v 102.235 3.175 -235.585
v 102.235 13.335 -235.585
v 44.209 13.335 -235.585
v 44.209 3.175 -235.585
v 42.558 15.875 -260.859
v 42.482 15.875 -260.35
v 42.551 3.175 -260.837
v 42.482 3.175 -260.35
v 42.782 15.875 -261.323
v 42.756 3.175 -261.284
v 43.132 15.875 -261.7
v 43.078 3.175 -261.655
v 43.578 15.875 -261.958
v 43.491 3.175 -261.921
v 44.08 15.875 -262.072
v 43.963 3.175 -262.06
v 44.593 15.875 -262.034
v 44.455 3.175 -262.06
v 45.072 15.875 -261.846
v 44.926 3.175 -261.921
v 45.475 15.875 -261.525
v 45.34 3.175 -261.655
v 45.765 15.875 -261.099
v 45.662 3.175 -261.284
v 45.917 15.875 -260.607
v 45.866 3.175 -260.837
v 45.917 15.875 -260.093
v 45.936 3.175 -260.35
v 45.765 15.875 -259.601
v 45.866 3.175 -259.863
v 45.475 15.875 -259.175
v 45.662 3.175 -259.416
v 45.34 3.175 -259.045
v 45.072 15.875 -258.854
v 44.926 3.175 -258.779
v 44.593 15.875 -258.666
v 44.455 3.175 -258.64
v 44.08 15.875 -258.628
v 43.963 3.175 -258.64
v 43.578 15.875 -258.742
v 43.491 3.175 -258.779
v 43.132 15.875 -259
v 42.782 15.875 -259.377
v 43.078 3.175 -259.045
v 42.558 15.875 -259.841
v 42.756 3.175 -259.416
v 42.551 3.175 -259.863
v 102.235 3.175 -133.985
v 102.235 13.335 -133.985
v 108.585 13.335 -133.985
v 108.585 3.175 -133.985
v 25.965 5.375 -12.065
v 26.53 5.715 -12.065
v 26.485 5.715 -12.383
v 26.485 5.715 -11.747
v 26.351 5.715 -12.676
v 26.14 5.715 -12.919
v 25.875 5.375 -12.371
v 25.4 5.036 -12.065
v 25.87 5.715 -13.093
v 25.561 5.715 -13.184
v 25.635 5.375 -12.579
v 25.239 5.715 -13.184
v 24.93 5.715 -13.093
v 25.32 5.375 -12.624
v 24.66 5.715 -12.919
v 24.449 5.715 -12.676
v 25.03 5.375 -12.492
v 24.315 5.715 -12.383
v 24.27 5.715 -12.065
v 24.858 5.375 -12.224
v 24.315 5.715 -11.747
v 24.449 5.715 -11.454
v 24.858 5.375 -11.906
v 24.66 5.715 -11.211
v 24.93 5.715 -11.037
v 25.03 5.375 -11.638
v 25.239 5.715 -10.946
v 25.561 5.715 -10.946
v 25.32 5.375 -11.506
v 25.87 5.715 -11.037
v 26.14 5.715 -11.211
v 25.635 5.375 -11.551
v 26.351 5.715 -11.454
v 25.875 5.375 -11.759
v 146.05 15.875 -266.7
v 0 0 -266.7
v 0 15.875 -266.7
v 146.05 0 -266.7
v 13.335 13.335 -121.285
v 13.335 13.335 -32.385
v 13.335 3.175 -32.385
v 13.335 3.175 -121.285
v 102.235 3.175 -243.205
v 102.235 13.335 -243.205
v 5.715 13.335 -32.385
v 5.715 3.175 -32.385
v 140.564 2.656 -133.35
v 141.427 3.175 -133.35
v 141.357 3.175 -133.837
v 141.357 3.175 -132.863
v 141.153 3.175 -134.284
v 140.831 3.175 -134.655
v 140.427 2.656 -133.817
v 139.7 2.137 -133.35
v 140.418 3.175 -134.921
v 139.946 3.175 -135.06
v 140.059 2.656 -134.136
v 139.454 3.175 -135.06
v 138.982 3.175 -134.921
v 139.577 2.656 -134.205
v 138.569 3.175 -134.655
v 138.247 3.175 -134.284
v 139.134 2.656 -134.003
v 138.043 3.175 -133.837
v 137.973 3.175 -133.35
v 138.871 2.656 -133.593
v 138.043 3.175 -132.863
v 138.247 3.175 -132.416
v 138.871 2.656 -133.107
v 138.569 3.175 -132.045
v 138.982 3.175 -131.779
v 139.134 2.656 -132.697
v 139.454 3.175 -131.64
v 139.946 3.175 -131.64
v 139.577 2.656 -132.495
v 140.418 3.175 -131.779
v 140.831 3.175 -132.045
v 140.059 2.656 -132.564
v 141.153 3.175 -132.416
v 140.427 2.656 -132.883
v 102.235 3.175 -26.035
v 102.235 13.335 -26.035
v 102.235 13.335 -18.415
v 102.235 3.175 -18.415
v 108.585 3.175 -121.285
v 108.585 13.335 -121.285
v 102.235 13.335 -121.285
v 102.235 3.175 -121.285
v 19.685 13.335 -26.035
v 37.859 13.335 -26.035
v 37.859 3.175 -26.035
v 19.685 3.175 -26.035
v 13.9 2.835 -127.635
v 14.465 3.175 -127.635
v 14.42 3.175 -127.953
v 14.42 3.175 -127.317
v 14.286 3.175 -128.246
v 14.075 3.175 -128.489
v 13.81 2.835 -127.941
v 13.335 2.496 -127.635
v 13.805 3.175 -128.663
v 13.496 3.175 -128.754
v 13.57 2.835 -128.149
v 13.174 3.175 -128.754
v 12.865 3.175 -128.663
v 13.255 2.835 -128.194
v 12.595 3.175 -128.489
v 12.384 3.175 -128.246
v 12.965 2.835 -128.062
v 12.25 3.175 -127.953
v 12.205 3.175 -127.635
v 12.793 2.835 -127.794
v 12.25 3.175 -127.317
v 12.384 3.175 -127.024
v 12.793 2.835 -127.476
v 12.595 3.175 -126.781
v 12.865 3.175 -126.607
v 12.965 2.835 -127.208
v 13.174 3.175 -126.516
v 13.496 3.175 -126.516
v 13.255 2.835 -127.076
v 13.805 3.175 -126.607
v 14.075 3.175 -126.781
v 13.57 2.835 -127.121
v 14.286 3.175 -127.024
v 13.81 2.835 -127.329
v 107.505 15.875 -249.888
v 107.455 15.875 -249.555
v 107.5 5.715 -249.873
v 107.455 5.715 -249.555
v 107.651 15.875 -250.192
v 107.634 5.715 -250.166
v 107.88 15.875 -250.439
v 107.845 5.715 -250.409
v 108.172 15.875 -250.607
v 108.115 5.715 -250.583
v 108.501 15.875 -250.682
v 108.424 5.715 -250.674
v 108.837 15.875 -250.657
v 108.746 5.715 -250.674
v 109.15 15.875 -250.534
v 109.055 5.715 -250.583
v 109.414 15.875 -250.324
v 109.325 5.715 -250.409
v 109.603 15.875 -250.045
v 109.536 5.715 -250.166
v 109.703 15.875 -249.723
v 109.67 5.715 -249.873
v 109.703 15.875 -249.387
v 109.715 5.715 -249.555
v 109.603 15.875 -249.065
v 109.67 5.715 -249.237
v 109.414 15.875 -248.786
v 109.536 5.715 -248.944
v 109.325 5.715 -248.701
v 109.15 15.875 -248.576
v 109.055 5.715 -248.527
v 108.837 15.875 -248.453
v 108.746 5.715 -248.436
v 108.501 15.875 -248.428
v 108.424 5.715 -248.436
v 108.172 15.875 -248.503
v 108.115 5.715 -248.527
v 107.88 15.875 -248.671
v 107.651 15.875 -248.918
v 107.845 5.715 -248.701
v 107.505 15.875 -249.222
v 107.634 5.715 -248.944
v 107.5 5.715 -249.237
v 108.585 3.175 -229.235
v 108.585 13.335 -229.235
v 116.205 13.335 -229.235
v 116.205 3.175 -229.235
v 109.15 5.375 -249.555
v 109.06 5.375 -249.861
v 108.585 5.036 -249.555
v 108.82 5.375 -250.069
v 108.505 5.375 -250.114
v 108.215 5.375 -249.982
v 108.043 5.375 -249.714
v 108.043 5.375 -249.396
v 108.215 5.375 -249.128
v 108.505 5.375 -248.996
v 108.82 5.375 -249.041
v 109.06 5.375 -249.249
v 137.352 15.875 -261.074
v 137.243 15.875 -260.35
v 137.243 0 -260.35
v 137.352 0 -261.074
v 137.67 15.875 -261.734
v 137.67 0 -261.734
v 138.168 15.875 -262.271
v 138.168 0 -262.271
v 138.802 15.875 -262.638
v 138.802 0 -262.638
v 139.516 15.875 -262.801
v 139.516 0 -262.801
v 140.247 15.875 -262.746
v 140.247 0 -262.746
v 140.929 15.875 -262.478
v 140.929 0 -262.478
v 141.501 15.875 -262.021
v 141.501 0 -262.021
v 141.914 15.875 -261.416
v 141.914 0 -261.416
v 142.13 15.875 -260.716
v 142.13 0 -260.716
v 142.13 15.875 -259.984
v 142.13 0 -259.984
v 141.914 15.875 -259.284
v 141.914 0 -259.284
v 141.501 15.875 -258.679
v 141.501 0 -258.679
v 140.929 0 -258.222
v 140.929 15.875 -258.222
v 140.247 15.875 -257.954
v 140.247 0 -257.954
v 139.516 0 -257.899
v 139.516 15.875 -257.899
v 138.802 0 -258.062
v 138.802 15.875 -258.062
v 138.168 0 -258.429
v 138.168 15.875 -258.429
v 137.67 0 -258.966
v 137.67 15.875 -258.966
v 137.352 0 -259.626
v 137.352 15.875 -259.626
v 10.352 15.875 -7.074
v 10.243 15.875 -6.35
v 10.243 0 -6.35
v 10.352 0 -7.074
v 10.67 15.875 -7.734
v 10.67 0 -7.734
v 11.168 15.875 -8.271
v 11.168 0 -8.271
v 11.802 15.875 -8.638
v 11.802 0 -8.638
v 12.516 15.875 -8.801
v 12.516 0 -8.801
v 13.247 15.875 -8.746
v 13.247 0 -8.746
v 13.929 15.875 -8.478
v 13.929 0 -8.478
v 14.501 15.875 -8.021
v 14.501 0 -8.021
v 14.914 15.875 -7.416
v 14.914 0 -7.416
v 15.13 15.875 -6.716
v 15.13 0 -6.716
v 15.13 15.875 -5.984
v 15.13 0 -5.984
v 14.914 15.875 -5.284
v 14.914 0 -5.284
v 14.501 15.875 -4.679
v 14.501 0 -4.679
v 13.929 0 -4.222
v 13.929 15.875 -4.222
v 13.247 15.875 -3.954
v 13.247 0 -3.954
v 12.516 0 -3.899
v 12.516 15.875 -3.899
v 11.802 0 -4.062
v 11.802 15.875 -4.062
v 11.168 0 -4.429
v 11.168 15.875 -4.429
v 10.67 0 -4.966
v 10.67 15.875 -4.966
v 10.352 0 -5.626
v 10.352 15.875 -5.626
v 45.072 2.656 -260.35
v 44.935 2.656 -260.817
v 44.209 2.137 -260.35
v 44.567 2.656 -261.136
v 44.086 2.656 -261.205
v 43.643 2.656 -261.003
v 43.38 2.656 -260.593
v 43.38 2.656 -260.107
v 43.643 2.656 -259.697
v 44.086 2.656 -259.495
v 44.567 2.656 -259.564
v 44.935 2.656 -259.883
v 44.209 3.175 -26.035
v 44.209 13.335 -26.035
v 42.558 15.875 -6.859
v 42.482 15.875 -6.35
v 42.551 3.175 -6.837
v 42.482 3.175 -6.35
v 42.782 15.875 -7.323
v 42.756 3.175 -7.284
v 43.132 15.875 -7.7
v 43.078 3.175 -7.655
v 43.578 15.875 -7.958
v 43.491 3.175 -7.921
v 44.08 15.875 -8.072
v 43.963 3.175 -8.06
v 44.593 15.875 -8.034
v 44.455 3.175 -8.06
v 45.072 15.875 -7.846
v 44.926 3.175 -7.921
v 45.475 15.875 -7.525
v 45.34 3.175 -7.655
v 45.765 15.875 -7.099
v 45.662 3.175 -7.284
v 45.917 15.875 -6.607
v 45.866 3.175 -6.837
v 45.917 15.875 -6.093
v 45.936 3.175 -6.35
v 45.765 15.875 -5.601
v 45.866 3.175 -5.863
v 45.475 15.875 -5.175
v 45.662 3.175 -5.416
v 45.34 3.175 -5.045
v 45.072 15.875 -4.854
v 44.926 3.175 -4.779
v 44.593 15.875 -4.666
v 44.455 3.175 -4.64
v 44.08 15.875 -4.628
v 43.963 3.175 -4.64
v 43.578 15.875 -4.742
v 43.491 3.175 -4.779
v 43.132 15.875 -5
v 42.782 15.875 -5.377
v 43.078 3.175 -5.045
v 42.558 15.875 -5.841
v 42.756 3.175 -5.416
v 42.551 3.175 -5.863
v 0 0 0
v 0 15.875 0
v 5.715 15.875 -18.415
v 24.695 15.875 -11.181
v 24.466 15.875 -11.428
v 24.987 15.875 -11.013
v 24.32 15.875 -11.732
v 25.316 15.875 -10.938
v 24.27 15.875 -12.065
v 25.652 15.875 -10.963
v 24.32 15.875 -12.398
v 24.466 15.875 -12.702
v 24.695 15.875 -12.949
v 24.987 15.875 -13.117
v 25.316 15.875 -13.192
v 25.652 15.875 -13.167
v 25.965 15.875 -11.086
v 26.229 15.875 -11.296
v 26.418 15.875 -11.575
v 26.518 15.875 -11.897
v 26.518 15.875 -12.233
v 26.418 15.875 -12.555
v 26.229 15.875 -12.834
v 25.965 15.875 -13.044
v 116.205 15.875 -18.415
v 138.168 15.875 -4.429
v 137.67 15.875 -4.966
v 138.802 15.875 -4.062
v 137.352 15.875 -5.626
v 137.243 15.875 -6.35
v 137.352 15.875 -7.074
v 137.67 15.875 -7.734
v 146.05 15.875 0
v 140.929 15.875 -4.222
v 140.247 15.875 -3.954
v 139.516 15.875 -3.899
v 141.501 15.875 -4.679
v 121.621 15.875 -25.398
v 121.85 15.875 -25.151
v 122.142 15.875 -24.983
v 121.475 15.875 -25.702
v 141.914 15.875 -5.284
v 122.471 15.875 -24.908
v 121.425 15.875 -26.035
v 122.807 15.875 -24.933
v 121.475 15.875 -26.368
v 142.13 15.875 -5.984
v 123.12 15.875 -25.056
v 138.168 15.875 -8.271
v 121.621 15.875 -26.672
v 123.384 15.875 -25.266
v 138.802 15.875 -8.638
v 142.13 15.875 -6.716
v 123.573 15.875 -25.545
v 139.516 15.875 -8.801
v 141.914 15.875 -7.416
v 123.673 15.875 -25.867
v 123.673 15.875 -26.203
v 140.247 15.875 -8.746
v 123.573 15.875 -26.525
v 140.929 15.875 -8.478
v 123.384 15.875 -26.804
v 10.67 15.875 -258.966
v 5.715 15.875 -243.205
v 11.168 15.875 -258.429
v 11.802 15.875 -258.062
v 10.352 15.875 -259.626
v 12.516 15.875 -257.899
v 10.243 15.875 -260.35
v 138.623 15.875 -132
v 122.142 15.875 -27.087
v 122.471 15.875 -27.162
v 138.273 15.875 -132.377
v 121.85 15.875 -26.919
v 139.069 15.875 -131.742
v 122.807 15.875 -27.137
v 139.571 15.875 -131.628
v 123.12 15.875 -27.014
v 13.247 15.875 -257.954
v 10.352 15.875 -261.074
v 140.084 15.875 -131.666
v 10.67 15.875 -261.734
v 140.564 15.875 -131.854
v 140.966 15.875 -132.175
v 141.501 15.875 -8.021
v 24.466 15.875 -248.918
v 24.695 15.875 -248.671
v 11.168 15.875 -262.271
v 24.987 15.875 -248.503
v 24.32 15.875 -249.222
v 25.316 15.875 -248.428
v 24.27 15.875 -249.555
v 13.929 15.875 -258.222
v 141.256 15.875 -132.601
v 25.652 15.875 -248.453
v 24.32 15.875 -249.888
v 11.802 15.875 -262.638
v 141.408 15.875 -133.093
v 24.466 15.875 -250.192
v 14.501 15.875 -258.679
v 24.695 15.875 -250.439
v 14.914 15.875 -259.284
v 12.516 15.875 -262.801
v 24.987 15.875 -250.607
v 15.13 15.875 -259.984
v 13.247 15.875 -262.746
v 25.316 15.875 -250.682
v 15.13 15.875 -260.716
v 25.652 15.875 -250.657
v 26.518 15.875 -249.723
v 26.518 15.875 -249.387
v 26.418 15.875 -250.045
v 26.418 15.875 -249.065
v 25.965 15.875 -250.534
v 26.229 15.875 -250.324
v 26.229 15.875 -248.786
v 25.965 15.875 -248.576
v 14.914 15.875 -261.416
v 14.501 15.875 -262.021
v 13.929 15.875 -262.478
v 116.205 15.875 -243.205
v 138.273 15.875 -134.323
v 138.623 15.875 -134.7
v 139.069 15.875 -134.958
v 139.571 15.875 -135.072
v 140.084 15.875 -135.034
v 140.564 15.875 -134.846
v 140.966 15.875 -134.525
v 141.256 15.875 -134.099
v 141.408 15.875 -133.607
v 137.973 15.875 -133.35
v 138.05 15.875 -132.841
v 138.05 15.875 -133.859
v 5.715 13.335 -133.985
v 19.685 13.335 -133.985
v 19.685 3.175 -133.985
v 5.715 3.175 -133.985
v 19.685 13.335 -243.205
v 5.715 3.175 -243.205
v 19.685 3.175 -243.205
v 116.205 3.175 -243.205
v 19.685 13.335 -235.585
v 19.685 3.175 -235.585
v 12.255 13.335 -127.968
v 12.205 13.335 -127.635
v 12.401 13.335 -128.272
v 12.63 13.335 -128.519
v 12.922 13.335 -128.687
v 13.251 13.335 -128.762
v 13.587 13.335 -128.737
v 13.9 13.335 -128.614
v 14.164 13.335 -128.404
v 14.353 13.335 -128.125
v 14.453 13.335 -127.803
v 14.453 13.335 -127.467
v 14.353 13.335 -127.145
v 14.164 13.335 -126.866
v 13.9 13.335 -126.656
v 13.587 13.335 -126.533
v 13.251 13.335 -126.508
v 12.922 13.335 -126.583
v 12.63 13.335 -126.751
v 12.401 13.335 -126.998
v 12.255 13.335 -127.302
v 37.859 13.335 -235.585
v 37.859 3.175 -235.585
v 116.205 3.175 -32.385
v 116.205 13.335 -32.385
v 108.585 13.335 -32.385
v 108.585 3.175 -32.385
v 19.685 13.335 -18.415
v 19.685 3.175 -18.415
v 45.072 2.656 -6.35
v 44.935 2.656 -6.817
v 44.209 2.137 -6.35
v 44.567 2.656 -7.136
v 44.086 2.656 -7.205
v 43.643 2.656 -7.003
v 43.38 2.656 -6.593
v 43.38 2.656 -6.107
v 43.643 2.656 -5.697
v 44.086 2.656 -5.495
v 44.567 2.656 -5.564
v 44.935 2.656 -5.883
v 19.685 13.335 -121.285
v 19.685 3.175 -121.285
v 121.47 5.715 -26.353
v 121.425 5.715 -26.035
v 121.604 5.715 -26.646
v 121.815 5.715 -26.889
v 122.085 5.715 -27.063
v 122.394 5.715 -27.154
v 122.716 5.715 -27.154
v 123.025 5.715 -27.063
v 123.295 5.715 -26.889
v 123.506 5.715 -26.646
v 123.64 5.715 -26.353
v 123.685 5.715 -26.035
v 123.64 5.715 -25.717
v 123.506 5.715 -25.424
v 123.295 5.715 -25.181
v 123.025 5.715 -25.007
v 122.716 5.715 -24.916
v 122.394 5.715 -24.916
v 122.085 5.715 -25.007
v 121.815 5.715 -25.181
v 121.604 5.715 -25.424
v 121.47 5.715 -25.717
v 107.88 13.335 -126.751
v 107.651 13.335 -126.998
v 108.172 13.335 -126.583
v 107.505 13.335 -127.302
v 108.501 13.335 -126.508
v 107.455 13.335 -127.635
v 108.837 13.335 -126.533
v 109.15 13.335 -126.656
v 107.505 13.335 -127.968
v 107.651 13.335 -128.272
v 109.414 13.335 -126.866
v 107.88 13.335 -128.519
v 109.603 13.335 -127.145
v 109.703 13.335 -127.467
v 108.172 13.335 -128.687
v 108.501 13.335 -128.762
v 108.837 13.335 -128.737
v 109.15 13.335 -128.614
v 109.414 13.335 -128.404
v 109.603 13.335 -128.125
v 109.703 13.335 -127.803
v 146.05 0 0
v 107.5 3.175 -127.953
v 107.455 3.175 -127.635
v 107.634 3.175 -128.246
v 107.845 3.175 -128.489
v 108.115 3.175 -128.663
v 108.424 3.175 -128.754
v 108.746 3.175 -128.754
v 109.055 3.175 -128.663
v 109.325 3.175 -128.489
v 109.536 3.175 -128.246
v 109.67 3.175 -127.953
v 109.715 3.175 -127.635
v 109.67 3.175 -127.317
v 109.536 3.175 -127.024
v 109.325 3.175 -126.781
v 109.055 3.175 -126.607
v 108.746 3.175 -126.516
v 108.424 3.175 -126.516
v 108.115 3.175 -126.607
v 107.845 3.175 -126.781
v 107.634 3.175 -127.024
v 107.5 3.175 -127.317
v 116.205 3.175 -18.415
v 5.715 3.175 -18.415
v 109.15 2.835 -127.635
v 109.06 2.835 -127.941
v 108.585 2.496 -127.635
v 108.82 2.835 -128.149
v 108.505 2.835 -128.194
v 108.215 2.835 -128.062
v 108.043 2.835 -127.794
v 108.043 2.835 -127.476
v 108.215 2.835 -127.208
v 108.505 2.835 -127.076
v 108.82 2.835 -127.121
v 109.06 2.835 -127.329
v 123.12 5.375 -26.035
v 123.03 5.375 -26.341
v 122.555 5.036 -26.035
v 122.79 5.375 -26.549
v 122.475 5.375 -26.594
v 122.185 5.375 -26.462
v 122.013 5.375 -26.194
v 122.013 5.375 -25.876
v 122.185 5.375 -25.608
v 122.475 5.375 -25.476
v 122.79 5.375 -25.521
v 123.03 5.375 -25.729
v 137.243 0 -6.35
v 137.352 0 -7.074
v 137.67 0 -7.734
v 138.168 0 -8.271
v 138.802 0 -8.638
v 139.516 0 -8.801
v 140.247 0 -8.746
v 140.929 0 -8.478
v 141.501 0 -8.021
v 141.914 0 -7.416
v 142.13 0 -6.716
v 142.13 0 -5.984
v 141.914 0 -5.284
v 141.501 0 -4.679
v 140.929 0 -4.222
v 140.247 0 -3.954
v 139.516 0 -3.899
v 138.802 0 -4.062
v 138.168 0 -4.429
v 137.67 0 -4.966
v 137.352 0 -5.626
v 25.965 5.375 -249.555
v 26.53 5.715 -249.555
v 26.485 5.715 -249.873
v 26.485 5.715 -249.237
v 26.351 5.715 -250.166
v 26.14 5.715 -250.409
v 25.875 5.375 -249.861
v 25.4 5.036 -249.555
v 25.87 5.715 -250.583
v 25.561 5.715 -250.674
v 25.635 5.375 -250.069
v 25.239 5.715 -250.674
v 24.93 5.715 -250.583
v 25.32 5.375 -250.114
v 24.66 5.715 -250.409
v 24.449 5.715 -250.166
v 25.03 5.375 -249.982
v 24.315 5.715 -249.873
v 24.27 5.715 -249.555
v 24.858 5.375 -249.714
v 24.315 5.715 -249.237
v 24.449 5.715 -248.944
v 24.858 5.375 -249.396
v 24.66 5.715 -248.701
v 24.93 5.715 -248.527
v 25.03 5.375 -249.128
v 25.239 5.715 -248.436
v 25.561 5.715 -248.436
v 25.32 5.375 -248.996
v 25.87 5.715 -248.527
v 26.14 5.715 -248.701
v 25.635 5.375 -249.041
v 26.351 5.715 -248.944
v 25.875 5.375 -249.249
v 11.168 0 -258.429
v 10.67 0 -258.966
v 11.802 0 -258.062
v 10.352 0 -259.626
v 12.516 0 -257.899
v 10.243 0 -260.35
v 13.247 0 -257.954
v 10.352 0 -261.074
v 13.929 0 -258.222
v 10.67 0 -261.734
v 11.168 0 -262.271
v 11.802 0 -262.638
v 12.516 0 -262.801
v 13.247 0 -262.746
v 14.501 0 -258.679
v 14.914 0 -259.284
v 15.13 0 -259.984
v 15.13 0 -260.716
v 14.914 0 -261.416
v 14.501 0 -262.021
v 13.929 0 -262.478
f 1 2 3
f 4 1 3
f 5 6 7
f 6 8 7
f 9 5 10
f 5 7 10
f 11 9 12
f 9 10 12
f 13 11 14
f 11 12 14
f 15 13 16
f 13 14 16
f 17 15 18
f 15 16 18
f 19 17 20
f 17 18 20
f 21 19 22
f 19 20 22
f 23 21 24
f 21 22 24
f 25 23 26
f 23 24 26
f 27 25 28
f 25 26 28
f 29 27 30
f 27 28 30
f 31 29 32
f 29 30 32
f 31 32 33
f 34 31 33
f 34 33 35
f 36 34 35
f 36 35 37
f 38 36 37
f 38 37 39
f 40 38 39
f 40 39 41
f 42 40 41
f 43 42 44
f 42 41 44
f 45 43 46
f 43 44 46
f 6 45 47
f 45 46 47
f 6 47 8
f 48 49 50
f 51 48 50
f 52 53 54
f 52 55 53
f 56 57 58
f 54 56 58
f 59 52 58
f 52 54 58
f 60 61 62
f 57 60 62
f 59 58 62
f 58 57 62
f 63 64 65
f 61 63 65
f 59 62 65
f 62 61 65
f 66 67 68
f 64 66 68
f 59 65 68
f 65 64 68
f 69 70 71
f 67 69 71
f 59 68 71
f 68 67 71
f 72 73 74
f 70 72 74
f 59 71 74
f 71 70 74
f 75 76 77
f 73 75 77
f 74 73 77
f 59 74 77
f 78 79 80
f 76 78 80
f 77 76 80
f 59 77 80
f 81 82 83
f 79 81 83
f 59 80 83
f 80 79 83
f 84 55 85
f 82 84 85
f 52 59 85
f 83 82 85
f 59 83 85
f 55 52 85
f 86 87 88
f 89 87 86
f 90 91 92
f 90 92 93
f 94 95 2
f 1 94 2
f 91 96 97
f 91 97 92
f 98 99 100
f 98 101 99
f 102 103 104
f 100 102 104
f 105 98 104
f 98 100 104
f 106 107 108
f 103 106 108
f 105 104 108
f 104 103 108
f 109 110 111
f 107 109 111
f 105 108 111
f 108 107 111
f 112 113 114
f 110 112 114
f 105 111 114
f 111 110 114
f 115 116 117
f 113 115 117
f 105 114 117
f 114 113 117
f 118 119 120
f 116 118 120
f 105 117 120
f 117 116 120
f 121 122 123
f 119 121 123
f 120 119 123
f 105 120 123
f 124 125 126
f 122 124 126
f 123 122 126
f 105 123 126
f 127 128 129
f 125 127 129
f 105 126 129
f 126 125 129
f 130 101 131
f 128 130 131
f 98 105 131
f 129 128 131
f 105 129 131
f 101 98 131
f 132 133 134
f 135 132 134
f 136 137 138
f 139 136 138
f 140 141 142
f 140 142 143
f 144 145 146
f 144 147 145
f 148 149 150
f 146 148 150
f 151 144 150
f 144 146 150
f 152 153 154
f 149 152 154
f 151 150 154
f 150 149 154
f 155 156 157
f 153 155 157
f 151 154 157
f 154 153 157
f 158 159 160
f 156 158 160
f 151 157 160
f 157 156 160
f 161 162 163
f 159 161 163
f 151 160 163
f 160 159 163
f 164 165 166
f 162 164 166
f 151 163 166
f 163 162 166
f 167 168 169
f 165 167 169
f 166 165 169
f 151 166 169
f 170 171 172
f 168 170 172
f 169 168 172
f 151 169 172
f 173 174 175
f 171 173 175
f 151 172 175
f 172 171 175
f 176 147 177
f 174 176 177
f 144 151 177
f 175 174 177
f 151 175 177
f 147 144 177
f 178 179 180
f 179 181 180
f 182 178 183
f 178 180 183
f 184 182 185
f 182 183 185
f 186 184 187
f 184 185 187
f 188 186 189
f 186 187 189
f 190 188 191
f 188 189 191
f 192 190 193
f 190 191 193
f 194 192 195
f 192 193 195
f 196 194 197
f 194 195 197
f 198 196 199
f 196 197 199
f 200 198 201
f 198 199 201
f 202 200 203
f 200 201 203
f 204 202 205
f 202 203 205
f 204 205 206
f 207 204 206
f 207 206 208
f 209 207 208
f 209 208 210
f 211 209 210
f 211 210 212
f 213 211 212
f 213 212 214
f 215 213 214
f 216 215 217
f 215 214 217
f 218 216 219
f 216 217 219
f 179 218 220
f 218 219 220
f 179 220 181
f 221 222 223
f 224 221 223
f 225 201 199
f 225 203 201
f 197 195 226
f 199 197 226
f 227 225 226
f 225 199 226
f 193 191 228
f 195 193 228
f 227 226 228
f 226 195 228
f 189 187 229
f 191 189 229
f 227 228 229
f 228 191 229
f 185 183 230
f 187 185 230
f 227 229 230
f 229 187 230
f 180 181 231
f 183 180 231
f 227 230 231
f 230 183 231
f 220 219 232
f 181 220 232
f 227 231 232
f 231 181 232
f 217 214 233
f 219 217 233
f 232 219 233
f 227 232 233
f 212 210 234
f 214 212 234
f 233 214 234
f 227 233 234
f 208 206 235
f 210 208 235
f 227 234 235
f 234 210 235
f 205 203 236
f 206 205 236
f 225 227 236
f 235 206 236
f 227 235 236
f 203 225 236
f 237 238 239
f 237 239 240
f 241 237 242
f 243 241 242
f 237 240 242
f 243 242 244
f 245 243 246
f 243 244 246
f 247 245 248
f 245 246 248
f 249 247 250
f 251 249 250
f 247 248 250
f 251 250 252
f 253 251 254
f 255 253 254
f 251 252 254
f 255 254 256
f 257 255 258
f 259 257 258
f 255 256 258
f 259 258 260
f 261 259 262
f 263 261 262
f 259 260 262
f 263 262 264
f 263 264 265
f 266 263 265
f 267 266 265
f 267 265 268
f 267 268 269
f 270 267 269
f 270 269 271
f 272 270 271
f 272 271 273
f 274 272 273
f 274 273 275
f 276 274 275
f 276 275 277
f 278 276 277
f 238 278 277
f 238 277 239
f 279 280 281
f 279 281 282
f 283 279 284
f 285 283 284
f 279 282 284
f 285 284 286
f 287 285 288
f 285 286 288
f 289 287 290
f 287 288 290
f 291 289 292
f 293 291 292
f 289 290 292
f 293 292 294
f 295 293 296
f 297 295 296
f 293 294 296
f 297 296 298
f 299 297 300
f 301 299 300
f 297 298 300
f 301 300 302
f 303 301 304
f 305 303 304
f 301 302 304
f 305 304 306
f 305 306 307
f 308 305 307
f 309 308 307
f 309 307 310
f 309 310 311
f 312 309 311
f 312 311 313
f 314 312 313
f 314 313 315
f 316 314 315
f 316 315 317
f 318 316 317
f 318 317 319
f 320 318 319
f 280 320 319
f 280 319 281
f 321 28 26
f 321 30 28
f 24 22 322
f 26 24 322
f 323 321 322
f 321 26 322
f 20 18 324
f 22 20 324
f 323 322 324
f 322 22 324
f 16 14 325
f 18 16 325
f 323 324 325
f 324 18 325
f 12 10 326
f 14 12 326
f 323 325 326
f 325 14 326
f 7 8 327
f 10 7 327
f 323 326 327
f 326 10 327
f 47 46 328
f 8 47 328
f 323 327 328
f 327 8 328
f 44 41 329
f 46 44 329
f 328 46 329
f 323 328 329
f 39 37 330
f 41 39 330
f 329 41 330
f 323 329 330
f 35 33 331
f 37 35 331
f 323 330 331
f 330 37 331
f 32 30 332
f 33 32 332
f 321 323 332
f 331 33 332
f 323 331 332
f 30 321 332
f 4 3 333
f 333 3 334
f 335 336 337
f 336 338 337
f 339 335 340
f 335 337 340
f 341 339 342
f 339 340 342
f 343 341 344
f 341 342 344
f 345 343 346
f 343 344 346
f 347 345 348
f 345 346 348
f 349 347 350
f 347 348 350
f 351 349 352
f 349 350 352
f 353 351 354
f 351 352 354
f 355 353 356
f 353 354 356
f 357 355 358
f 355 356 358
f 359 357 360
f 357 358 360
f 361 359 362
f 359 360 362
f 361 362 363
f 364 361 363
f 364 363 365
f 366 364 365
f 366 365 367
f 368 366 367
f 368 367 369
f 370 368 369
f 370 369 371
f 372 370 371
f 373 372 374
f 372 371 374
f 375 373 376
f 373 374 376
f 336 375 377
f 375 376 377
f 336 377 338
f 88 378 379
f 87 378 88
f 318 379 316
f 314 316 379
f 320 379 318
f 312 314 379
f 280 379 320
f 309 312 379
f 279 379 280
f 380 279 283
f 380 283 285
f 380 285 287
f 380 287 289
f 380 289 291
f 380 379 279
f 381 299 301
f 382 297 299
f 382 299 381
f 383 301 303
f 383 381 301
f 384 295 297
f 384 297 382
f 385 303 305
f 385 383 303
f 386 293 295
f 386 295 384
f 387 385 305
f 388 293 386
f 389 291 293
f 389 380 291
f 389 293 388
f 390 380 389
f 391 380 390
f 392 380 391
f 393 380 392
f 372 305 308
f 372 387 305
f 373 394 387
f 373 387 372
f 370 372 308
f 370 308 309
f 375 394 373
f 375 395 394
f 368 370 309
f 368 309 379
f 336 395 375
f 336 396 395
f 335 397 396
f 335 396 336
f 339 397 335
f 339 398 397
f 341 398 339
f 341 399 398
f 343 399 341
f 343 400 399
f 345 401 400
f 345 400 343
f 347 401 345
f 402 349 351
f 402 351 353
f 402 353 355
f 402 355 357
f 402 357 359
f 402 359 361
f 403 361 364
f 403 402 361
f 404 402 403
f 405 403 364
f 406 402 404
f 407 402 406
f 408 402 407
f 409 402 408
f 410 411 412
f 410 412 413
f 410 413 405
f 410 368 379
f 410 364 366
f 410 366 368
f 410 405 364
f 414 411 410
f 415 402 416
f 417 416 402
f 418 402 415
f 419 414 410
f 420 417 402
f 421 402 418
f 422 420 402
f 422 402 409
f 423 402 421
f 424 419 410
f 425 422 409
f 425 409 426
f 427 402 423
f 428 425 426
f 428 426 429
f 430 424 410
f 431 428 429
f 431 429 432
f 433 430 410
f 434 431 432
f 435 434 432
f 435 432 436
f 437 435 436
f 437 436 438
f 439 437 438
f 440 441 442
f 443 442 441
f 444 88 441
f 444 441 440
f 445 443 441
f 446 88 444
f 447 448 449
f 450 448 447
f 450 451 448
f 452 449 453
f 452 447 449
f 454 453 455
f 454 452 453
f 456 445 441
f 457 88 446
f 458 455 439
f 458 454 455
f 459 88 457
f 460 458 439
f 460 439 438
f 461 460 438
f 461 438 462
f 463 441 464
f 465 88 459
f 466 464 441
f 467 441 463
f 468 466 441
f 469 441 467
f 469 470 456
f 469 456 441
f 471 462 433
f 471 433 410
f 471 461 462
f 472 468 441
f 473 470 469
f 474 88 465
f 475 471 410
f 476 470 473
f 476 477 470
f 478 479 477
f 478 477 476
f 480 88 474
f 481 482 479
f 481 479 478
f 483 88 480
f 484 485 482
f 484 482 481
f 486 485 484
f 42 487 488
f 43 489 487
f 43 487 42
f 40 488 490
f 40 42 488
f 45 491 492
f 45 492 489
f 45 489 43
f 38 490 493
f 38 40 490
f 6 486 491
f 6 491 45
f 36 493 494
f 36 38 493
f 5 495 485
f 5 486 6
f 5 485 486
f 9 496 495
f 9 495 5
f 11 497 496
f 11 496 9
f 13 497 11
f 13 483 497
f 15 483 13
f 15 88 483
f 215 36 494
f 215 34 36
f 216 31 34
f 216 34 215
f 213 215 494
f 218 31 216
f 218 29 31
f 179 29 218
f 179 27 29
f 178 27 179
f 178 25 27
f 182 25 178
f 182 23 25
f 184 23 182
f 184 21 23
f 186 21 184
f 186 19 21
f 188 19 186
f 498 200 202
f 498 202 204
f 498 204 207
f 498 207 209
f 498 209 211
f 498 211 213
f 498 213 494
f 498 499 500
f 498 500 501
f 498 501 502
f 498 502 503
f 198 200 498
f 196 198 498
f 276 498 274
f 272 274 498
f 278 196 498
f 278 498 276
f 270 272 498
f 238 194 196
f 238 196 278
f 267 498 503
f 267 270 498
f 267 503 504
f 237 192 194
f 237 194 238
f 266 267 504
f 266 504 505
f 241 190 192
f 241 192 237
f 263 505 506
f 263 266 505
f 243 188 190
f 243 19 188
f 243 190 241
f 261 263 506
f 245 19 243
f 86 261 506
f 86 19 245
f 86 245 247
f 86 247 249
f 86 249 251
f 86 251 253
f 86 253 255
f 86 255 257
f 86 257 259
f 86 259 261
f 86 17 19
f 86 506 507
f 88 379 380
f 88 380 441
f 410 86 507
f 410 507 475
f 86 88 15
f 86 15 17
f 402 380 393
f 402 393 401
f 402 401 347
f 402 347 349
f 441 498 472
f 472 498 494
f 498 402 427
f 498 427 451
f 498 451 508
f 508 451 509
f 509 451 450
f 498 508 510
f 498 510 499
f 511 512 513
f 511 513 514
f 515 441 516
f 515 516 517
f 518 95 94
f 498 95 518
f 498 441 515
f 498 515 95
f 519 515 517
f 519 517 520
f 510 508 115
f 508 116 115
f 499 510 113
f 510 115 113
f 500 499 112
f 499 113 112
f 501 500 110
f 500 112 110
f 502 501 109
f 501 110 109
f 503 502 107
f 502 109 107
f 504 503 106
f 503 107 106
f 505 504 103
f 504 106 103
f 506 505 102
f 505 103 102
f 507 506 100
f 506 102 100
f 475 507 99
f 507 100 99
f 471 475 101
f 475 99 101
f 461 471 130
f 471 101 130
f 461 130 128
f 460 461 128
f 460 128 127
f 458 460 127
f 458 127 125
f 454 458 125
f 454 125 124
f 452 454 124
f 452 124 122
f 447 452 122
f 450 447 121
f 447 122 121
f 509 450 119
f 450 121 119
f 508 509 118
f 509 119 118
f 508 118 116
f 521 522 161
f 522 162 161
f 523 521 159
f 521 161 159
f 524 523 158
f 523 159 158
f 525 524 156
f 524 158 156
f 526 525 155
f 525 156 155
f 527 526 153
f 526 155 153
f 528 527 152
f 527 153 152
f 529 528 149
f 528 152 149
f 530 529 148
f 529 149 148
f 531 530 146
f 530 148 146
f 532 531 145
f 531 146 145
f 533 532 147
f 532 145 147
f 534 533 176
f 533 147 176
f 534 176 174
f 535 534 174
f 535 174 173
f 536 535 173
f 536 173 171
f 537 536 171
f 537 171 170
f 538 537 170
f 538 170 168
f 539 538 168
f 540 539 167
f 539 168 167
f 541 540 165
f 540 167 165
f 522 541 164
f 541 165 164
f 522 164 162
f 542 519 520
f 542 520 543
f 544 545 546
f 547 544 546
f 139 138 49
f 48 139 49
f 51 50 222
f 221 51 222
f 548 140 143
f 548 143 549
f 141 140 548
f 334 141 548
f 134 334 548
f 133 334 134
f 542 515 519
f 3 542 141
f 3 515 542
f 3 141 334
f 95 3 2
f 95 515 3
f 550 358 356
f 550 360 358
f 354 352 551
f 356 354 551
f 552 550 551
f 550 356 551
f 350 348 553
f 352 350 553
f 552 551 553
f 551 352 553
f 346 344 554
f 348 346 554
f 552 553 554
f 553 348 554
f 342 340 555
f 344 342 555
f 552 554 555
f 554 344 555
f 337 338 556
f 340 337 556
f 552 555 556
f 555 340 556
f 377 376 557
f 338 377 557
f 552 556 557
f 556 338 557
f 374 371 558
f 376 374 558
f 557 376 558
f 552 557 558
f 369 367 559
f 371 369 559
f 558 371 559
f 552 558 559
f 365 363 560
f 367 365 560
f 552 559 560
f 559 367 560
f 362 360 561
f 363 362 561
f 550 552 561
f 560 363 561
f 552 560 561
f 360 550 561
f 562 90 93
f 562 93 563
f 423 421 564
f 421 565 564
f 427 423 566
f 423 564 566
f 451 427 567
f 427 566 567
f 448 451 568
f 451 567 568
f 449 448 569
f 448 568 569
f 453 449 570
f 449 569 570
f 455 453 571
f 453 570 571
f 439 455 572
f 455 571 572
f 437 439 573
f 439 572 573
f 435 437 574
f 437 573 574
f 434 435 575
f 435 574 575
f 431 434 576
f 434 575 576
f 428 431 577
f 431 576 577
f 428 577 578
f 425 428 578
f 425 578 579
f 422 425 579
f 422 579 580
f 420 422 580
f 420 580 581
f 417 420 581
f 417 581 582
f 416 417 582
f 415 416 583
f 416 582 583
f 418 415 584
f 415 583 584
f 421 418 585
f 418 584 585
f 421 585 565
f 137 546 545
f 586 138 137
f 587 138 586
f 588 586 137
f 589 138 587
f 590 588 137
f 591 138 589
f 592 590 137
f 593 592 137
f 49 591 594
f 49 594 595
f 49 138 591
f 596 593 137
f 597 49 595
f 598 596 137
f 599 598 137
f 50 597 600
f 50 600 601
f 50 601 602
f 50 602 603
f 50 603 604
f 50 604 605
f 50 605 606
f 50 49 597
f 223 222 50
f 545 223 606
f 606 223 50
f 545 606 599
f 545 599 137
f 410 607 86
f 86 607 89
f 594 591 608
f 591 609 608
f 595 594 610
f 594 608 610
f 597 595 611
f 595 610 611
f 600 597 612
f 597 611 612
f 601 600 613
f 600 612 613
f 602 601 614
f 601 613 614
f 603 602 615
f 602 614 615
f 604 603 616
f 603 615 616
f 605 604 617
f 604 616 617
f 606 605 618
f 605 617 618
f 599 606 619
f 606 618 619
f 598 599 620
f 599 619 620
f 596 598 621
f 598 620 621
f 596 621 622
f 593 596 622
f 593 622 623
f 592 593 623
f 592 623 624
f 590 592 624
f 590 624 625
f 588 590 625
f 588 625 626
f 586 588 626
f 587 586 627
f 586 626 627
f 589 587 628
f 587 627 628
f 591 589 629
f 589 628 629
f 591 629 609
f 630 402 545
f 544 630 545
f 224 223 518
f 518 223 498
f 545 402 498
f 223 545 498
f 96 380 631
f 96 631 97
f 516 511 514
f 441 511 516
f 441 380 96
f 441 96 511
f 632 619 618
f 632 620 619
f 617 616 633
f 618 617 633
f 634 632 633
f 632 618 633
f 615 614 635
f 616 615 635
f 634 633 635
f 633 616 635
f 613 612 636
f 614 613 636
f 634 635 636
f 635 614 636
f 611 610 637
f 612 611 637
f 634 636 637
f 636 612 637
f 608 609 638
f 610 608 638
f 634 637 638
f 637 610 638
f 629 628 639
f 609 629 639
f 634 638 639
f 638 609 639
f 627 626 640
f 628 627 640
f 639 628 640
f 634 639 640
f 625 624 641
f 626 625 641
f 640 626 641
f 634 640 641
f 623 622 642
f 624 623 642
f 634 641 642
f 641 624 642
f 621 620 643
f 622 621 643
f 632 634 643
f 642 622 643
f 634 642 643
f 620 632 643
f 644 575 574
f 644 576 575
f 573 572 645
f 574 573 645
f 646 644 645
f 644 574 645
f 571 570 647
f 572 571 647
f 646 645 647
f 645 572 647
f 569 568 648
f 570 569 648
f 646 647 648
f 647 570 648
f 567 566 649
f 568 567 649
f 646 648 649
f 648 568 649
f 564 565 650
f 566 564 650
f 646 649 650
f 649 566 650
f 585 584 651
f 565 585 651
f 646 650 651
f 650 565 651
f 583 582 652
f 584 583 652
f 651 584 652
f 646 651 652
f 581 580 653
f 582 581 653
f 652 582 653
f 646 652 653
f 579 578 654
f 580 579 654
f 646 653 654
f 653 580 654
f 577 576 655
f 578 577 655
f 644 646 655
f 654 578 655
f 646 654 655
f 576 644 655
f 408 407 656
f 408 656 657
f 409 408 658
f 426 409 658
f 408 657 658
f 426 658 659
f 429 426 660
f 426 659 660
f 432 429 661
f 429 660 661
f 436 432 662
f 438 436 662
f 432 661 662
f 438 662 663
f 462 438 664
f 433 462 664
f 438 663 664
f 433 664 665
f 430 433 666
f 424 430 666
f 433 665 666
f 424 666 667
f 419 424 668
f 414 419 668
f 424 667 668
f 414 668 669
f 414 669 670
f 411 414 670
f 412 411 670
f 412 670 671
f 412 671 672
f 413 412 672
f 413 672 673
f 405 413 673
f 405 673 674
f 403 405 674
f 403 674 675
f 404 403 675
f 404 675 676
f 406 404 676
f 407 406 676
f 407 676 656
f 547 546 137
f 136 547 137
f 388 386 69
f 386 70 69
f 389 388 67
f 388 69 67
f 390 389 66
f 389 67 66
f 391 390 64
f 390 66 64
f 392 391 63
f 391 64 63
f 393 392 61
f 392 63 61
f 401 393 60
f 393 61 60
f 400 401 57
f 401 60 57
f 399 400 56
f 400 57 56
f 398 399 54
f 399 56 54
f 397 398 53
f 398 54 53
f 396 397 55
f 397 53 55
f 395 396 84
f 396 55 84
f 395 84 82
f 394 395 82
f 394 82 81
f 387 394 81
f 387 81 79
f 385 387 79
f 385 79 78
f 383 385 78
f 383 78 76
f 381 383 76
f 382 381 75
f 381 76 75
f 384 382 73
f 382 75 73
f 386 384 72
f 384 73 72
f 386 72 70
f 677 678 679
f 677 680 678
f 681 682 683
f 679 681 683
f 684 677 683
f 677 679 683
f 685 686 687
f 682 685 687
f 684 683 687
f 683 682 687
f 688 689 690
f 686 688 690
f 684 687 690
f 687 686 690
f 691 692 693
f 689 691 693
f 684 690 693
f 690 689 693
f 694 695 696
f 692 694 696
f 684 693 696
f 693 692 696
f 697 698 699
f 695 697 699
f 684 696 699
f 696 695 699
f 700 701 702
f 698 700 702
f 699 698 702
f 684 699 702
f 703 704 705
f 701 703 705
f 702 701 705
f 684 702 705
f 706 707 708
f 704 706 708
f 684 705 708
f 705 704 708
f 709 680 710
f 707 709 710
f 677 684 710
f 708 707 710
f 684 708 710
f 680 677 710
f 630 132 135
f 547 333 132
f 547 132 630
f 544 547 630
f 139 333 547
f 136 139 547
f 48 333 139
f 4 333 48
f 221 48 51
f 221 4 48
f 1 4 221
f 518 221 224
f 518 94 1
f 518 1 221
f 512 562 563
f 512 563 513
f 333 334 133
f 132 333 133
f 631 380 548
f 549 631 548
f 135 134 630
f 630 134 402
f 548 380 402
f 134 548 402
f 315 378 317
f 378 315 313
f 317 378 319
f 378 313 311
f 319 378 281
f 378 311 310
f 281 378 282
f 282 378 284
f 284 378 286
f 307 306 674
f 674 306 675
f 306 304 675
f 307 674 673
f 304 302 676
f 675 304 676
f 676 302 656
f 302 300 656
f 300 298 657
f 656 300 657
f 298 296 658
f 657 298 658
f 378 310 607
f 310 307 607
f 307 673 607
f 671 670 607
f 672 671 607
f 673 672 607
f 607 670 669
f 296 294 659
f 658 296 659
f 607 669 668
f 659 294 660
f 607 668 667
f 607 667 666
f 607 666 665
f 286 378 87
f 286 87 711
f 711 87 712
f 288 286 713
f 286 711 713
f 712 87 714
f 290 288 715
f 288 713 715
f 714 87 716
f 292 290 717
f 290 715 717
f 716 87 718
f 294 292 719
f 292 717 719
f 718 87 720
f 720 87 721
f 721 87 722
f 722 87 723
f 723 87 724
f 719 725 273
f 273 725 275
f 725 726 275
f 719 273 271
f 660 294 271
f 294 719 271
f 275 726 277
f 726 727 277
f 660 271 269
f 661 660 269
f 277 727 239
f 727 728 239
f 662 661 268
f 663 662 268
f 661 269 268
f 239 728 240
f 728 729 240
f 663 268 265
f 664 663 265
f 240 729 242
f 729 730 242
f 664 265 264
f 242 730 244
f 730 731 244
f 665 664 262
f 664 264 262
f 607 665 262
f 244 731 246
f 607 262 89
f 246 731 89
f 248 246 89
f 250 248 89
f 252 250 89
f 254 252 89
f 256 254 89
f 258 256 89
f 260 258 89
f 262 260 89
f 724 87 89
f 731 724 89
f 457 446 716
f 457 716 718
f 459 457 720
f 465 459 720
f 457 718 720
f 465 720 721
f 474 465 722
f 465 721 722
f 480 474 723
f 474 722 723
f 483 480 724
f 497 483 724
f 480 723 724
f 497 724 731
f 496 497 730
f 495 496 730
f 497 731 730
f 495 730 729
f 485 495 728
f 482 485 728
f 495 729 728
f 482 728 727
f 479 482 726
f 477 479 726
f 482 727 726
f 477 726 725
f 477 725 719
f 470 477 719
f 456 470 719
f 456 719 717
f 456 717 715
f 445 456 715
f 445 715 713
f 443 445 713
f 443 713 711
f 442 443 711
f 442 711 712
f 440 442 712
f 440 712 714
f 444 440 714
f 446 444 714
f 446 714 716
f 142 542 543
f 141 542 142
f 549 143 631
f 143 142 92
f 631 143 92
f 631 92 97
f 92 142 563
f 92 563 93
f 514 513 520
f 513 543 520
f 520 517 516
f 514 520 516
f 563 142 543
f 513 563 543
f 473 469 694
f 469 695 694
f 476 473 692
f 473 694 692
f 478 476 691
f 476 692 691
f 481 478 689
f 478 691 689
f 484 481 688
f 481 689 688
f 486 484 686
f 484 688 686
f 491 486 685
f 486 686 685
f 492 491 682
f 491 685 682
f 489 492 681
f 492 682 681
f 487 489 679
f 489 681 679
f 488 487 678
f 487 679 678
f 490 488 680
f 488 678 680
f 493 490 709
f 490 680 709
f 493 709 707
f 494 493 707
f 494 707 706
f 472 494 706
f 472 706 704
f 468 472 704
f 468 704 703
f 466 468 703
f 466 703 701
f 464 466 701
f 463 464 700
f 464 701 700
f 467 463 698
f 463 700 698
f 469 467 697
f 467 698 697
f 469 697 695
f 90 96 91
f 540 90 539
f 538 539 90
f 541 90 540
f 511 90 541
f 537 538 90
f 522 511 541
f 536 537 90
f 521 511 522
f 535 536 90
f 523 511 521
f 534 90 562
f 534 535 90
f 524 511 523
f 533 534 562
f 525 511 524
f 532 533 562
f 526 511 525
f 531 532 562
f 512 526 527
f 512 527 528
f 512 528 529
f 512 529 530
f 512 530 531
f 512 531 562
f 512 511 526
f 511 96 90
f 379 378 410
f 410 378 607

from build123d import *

# Parameters (mm, degrees)
SKETCH1_W                 = 146.05
SKETCH1_H                 = 266.7
BOSS_EXTRUDE1_DEPTH       = 15.875
SKETCH2_W                 = 110.49
SKETCH2_H                 = 224.79
CUT_EXTRUDE1_DEPTH        = 2.54
CUT_EXTRUDE2_DEPTH        = 10.16
F_4_40_TAPPED_HOLE1_D     = 2.2606
F_4_40_TAPPED_HOLE1_DEPTH = 10.16
F_4_40_TAPPED_HOLE1_TIP   = 0.679152758
F_8_CLEARANCE_HOLE1_D     = 4.9149
F_8_32_TAPPED_HOLE1_D     = 3.4544
F_8_32_TAPPED_HOLE1_DEPTH = 12.7
F_8_32_TAPPED_HOLE1_TIP   = 1.037806461
F_4_40_TAPPED_HOLE2_D     = 2.2606
F_4_40_TAPPED_HOLE2_DEPTH = 10.16
F_4_40_TAPPED_HOLE2_TIP   = 0.679152758


with BuildPart() as part:
    # Sketch1 → Boss-Extrude1 (new body)
    with BuildSketch(Plane(origin=(0, 0, 0), x_dir=(1, 0, 0), z_dir=(0, 1, 0))):
        with Locations((73.025, 133.35)):
            Rectangle(SKETCH1_W, SKETCH1_H)
    extrude(amount=BOSS_EXTRUDE1_DEPTH)

    # Sketch2 → Cut-Extrude1 (cut)
    with BuildSketch(Plane(origin=(0, 15.875, 0), x_dir=(1, 0, 0), z_dir=(0, 1, 0))):
        with Locations((60.96, 130.81)):
            Rectangle(SKETCH2_W, SKETCH2_H)
    extrude(amount=-CUT_EXTRUDE1_DEPTH, mode=Mode.SUBTRACT)

    # Sketch3 → Cut-Extrude2 (cut)
    with BuildSketch(Plane(origin=(0, 13.335, 0), x_dir=(1, 0, 0), z_dir=(0, 1, 0))):
        Polygon((19.685, 26.035), (19.685, 18.415), (5.715, 18.415), (5.715, 32.385), (13.335, 32.385), (13.335, 121.285), (19.685, 121.285), (19.685, 133.985), (5.715, 133.985), (5.715, 243.205), (19.685, 243.205), (19.685, 235.585), (37.8587, 235.585), (37.8587, 26.035), align=None)
        Polygon((44.2087, 26.035), (102.235, 26.035), (102.235, 18.415), (116.205, 18.415), (116.205, 32.385), (108.585, 32.385), (108.585, 121.285), (102.235, 121.285), (102.235, 133.985), (108.585, 133.985), (108.585, 229.235), (116.205, 229.235), (116.205, 243.205), (102.235, 243.205), (102.235, 235.585), (44.2087, 235.585), align=None)
    extrude(amount=-CUT_EXTRUDE2_DEPTH, mode=Mode.SUBTRACT)

    # #4-40 Tapped Hole1
    with Locations(Plane(origin=(0, 13.335, 0), x_dir=(1, 0, 0), z_dir=(0, 1, 0))):
        with Locations((108.585, 127.635), (13.335, 127.635)):
            Hole(F_4_40_TAPPED_HOLE1_D / 2, depth=F_4_40_TAPPED_HOLE1_DEPTH)
            with Locations((0, 0, -(F_4_40_TAPPED_HOLE1_DEPTH + F_4_40_TAPPED_HOLE1_TIP / 2))):  # 118° drill point
                Cone(0, F_4_40_TAPPED_HOLE1_D / 2, F_4_40_TAPPED_HOLE1_TIP, mode=Mode.SUBTRACT)

    # #8 Clearance Hole1 (through all)
    with Locations(Plane(origin=(0, 15.875, 0), x_dir=(1, 0, 0), z_dir=(0, 1, 0))):
        with Locations((12.7, 6.35), (139.7, 6.35), (139.7, 260.35), (12.7, 260.35)):
            Hole(F_8_CLEARANCE_HOLE1_D / 2)

    # #8-32 Tapped Hole1
    with Locations(Plane(origin=(0, 15.875, 0), x_dir=(1, 0, 0), z_dir=(0, 1, 0))):
        with Locations((44.2087, 6.35), (44.2087, 260.35), (139.7, 133.35)):
            Hole(F_8_32_TAPPED_HOLE1_D / 2, depth=F_8_32_TAPPED_HOLE1_DEPTH)
            with Locations((0, 0, -(F_8_32_TAPPED_HOLE1_DEPTH + F_8_32_TAPPED_HOLE1_TIP / 2))):  # 118° drill point
                Cone(0, F_8_32_TAPPED_HOLE1_D / 2, F_8_32_TAPPED_HOLE1_TIP, mode=Mode.SUBTRACT)

    # #4-40 Tapped Hole2
    with Locations(Plane(origin=(0, 15.875, 0), x_dir=(1, 0, 0), z_dir=(0, 1, 0))):
        with Locations((108.585, 249.555), (122.555, 26.035), (25.4, 249.555), (25.4, 12.065)):
            Hole(F_4_40_TAPPED_HOLE2_D / 2, depth=F_4_40_TAPPED_HOLE2_DEPTH)
            with Locations((0, 0, -(F_4_40_TAPPED_HOLE2_DEPTH + F_4_40_TAPPED_HOLE2_TIP / 2))):  # 118° drill point
                Cone(0, F_4_40_TAPPED_HOLE2_D / 2, F_4_40_TAPPED_HOLE2_TIP, mode=Mode.SUBTRACT)


solid = part.part
